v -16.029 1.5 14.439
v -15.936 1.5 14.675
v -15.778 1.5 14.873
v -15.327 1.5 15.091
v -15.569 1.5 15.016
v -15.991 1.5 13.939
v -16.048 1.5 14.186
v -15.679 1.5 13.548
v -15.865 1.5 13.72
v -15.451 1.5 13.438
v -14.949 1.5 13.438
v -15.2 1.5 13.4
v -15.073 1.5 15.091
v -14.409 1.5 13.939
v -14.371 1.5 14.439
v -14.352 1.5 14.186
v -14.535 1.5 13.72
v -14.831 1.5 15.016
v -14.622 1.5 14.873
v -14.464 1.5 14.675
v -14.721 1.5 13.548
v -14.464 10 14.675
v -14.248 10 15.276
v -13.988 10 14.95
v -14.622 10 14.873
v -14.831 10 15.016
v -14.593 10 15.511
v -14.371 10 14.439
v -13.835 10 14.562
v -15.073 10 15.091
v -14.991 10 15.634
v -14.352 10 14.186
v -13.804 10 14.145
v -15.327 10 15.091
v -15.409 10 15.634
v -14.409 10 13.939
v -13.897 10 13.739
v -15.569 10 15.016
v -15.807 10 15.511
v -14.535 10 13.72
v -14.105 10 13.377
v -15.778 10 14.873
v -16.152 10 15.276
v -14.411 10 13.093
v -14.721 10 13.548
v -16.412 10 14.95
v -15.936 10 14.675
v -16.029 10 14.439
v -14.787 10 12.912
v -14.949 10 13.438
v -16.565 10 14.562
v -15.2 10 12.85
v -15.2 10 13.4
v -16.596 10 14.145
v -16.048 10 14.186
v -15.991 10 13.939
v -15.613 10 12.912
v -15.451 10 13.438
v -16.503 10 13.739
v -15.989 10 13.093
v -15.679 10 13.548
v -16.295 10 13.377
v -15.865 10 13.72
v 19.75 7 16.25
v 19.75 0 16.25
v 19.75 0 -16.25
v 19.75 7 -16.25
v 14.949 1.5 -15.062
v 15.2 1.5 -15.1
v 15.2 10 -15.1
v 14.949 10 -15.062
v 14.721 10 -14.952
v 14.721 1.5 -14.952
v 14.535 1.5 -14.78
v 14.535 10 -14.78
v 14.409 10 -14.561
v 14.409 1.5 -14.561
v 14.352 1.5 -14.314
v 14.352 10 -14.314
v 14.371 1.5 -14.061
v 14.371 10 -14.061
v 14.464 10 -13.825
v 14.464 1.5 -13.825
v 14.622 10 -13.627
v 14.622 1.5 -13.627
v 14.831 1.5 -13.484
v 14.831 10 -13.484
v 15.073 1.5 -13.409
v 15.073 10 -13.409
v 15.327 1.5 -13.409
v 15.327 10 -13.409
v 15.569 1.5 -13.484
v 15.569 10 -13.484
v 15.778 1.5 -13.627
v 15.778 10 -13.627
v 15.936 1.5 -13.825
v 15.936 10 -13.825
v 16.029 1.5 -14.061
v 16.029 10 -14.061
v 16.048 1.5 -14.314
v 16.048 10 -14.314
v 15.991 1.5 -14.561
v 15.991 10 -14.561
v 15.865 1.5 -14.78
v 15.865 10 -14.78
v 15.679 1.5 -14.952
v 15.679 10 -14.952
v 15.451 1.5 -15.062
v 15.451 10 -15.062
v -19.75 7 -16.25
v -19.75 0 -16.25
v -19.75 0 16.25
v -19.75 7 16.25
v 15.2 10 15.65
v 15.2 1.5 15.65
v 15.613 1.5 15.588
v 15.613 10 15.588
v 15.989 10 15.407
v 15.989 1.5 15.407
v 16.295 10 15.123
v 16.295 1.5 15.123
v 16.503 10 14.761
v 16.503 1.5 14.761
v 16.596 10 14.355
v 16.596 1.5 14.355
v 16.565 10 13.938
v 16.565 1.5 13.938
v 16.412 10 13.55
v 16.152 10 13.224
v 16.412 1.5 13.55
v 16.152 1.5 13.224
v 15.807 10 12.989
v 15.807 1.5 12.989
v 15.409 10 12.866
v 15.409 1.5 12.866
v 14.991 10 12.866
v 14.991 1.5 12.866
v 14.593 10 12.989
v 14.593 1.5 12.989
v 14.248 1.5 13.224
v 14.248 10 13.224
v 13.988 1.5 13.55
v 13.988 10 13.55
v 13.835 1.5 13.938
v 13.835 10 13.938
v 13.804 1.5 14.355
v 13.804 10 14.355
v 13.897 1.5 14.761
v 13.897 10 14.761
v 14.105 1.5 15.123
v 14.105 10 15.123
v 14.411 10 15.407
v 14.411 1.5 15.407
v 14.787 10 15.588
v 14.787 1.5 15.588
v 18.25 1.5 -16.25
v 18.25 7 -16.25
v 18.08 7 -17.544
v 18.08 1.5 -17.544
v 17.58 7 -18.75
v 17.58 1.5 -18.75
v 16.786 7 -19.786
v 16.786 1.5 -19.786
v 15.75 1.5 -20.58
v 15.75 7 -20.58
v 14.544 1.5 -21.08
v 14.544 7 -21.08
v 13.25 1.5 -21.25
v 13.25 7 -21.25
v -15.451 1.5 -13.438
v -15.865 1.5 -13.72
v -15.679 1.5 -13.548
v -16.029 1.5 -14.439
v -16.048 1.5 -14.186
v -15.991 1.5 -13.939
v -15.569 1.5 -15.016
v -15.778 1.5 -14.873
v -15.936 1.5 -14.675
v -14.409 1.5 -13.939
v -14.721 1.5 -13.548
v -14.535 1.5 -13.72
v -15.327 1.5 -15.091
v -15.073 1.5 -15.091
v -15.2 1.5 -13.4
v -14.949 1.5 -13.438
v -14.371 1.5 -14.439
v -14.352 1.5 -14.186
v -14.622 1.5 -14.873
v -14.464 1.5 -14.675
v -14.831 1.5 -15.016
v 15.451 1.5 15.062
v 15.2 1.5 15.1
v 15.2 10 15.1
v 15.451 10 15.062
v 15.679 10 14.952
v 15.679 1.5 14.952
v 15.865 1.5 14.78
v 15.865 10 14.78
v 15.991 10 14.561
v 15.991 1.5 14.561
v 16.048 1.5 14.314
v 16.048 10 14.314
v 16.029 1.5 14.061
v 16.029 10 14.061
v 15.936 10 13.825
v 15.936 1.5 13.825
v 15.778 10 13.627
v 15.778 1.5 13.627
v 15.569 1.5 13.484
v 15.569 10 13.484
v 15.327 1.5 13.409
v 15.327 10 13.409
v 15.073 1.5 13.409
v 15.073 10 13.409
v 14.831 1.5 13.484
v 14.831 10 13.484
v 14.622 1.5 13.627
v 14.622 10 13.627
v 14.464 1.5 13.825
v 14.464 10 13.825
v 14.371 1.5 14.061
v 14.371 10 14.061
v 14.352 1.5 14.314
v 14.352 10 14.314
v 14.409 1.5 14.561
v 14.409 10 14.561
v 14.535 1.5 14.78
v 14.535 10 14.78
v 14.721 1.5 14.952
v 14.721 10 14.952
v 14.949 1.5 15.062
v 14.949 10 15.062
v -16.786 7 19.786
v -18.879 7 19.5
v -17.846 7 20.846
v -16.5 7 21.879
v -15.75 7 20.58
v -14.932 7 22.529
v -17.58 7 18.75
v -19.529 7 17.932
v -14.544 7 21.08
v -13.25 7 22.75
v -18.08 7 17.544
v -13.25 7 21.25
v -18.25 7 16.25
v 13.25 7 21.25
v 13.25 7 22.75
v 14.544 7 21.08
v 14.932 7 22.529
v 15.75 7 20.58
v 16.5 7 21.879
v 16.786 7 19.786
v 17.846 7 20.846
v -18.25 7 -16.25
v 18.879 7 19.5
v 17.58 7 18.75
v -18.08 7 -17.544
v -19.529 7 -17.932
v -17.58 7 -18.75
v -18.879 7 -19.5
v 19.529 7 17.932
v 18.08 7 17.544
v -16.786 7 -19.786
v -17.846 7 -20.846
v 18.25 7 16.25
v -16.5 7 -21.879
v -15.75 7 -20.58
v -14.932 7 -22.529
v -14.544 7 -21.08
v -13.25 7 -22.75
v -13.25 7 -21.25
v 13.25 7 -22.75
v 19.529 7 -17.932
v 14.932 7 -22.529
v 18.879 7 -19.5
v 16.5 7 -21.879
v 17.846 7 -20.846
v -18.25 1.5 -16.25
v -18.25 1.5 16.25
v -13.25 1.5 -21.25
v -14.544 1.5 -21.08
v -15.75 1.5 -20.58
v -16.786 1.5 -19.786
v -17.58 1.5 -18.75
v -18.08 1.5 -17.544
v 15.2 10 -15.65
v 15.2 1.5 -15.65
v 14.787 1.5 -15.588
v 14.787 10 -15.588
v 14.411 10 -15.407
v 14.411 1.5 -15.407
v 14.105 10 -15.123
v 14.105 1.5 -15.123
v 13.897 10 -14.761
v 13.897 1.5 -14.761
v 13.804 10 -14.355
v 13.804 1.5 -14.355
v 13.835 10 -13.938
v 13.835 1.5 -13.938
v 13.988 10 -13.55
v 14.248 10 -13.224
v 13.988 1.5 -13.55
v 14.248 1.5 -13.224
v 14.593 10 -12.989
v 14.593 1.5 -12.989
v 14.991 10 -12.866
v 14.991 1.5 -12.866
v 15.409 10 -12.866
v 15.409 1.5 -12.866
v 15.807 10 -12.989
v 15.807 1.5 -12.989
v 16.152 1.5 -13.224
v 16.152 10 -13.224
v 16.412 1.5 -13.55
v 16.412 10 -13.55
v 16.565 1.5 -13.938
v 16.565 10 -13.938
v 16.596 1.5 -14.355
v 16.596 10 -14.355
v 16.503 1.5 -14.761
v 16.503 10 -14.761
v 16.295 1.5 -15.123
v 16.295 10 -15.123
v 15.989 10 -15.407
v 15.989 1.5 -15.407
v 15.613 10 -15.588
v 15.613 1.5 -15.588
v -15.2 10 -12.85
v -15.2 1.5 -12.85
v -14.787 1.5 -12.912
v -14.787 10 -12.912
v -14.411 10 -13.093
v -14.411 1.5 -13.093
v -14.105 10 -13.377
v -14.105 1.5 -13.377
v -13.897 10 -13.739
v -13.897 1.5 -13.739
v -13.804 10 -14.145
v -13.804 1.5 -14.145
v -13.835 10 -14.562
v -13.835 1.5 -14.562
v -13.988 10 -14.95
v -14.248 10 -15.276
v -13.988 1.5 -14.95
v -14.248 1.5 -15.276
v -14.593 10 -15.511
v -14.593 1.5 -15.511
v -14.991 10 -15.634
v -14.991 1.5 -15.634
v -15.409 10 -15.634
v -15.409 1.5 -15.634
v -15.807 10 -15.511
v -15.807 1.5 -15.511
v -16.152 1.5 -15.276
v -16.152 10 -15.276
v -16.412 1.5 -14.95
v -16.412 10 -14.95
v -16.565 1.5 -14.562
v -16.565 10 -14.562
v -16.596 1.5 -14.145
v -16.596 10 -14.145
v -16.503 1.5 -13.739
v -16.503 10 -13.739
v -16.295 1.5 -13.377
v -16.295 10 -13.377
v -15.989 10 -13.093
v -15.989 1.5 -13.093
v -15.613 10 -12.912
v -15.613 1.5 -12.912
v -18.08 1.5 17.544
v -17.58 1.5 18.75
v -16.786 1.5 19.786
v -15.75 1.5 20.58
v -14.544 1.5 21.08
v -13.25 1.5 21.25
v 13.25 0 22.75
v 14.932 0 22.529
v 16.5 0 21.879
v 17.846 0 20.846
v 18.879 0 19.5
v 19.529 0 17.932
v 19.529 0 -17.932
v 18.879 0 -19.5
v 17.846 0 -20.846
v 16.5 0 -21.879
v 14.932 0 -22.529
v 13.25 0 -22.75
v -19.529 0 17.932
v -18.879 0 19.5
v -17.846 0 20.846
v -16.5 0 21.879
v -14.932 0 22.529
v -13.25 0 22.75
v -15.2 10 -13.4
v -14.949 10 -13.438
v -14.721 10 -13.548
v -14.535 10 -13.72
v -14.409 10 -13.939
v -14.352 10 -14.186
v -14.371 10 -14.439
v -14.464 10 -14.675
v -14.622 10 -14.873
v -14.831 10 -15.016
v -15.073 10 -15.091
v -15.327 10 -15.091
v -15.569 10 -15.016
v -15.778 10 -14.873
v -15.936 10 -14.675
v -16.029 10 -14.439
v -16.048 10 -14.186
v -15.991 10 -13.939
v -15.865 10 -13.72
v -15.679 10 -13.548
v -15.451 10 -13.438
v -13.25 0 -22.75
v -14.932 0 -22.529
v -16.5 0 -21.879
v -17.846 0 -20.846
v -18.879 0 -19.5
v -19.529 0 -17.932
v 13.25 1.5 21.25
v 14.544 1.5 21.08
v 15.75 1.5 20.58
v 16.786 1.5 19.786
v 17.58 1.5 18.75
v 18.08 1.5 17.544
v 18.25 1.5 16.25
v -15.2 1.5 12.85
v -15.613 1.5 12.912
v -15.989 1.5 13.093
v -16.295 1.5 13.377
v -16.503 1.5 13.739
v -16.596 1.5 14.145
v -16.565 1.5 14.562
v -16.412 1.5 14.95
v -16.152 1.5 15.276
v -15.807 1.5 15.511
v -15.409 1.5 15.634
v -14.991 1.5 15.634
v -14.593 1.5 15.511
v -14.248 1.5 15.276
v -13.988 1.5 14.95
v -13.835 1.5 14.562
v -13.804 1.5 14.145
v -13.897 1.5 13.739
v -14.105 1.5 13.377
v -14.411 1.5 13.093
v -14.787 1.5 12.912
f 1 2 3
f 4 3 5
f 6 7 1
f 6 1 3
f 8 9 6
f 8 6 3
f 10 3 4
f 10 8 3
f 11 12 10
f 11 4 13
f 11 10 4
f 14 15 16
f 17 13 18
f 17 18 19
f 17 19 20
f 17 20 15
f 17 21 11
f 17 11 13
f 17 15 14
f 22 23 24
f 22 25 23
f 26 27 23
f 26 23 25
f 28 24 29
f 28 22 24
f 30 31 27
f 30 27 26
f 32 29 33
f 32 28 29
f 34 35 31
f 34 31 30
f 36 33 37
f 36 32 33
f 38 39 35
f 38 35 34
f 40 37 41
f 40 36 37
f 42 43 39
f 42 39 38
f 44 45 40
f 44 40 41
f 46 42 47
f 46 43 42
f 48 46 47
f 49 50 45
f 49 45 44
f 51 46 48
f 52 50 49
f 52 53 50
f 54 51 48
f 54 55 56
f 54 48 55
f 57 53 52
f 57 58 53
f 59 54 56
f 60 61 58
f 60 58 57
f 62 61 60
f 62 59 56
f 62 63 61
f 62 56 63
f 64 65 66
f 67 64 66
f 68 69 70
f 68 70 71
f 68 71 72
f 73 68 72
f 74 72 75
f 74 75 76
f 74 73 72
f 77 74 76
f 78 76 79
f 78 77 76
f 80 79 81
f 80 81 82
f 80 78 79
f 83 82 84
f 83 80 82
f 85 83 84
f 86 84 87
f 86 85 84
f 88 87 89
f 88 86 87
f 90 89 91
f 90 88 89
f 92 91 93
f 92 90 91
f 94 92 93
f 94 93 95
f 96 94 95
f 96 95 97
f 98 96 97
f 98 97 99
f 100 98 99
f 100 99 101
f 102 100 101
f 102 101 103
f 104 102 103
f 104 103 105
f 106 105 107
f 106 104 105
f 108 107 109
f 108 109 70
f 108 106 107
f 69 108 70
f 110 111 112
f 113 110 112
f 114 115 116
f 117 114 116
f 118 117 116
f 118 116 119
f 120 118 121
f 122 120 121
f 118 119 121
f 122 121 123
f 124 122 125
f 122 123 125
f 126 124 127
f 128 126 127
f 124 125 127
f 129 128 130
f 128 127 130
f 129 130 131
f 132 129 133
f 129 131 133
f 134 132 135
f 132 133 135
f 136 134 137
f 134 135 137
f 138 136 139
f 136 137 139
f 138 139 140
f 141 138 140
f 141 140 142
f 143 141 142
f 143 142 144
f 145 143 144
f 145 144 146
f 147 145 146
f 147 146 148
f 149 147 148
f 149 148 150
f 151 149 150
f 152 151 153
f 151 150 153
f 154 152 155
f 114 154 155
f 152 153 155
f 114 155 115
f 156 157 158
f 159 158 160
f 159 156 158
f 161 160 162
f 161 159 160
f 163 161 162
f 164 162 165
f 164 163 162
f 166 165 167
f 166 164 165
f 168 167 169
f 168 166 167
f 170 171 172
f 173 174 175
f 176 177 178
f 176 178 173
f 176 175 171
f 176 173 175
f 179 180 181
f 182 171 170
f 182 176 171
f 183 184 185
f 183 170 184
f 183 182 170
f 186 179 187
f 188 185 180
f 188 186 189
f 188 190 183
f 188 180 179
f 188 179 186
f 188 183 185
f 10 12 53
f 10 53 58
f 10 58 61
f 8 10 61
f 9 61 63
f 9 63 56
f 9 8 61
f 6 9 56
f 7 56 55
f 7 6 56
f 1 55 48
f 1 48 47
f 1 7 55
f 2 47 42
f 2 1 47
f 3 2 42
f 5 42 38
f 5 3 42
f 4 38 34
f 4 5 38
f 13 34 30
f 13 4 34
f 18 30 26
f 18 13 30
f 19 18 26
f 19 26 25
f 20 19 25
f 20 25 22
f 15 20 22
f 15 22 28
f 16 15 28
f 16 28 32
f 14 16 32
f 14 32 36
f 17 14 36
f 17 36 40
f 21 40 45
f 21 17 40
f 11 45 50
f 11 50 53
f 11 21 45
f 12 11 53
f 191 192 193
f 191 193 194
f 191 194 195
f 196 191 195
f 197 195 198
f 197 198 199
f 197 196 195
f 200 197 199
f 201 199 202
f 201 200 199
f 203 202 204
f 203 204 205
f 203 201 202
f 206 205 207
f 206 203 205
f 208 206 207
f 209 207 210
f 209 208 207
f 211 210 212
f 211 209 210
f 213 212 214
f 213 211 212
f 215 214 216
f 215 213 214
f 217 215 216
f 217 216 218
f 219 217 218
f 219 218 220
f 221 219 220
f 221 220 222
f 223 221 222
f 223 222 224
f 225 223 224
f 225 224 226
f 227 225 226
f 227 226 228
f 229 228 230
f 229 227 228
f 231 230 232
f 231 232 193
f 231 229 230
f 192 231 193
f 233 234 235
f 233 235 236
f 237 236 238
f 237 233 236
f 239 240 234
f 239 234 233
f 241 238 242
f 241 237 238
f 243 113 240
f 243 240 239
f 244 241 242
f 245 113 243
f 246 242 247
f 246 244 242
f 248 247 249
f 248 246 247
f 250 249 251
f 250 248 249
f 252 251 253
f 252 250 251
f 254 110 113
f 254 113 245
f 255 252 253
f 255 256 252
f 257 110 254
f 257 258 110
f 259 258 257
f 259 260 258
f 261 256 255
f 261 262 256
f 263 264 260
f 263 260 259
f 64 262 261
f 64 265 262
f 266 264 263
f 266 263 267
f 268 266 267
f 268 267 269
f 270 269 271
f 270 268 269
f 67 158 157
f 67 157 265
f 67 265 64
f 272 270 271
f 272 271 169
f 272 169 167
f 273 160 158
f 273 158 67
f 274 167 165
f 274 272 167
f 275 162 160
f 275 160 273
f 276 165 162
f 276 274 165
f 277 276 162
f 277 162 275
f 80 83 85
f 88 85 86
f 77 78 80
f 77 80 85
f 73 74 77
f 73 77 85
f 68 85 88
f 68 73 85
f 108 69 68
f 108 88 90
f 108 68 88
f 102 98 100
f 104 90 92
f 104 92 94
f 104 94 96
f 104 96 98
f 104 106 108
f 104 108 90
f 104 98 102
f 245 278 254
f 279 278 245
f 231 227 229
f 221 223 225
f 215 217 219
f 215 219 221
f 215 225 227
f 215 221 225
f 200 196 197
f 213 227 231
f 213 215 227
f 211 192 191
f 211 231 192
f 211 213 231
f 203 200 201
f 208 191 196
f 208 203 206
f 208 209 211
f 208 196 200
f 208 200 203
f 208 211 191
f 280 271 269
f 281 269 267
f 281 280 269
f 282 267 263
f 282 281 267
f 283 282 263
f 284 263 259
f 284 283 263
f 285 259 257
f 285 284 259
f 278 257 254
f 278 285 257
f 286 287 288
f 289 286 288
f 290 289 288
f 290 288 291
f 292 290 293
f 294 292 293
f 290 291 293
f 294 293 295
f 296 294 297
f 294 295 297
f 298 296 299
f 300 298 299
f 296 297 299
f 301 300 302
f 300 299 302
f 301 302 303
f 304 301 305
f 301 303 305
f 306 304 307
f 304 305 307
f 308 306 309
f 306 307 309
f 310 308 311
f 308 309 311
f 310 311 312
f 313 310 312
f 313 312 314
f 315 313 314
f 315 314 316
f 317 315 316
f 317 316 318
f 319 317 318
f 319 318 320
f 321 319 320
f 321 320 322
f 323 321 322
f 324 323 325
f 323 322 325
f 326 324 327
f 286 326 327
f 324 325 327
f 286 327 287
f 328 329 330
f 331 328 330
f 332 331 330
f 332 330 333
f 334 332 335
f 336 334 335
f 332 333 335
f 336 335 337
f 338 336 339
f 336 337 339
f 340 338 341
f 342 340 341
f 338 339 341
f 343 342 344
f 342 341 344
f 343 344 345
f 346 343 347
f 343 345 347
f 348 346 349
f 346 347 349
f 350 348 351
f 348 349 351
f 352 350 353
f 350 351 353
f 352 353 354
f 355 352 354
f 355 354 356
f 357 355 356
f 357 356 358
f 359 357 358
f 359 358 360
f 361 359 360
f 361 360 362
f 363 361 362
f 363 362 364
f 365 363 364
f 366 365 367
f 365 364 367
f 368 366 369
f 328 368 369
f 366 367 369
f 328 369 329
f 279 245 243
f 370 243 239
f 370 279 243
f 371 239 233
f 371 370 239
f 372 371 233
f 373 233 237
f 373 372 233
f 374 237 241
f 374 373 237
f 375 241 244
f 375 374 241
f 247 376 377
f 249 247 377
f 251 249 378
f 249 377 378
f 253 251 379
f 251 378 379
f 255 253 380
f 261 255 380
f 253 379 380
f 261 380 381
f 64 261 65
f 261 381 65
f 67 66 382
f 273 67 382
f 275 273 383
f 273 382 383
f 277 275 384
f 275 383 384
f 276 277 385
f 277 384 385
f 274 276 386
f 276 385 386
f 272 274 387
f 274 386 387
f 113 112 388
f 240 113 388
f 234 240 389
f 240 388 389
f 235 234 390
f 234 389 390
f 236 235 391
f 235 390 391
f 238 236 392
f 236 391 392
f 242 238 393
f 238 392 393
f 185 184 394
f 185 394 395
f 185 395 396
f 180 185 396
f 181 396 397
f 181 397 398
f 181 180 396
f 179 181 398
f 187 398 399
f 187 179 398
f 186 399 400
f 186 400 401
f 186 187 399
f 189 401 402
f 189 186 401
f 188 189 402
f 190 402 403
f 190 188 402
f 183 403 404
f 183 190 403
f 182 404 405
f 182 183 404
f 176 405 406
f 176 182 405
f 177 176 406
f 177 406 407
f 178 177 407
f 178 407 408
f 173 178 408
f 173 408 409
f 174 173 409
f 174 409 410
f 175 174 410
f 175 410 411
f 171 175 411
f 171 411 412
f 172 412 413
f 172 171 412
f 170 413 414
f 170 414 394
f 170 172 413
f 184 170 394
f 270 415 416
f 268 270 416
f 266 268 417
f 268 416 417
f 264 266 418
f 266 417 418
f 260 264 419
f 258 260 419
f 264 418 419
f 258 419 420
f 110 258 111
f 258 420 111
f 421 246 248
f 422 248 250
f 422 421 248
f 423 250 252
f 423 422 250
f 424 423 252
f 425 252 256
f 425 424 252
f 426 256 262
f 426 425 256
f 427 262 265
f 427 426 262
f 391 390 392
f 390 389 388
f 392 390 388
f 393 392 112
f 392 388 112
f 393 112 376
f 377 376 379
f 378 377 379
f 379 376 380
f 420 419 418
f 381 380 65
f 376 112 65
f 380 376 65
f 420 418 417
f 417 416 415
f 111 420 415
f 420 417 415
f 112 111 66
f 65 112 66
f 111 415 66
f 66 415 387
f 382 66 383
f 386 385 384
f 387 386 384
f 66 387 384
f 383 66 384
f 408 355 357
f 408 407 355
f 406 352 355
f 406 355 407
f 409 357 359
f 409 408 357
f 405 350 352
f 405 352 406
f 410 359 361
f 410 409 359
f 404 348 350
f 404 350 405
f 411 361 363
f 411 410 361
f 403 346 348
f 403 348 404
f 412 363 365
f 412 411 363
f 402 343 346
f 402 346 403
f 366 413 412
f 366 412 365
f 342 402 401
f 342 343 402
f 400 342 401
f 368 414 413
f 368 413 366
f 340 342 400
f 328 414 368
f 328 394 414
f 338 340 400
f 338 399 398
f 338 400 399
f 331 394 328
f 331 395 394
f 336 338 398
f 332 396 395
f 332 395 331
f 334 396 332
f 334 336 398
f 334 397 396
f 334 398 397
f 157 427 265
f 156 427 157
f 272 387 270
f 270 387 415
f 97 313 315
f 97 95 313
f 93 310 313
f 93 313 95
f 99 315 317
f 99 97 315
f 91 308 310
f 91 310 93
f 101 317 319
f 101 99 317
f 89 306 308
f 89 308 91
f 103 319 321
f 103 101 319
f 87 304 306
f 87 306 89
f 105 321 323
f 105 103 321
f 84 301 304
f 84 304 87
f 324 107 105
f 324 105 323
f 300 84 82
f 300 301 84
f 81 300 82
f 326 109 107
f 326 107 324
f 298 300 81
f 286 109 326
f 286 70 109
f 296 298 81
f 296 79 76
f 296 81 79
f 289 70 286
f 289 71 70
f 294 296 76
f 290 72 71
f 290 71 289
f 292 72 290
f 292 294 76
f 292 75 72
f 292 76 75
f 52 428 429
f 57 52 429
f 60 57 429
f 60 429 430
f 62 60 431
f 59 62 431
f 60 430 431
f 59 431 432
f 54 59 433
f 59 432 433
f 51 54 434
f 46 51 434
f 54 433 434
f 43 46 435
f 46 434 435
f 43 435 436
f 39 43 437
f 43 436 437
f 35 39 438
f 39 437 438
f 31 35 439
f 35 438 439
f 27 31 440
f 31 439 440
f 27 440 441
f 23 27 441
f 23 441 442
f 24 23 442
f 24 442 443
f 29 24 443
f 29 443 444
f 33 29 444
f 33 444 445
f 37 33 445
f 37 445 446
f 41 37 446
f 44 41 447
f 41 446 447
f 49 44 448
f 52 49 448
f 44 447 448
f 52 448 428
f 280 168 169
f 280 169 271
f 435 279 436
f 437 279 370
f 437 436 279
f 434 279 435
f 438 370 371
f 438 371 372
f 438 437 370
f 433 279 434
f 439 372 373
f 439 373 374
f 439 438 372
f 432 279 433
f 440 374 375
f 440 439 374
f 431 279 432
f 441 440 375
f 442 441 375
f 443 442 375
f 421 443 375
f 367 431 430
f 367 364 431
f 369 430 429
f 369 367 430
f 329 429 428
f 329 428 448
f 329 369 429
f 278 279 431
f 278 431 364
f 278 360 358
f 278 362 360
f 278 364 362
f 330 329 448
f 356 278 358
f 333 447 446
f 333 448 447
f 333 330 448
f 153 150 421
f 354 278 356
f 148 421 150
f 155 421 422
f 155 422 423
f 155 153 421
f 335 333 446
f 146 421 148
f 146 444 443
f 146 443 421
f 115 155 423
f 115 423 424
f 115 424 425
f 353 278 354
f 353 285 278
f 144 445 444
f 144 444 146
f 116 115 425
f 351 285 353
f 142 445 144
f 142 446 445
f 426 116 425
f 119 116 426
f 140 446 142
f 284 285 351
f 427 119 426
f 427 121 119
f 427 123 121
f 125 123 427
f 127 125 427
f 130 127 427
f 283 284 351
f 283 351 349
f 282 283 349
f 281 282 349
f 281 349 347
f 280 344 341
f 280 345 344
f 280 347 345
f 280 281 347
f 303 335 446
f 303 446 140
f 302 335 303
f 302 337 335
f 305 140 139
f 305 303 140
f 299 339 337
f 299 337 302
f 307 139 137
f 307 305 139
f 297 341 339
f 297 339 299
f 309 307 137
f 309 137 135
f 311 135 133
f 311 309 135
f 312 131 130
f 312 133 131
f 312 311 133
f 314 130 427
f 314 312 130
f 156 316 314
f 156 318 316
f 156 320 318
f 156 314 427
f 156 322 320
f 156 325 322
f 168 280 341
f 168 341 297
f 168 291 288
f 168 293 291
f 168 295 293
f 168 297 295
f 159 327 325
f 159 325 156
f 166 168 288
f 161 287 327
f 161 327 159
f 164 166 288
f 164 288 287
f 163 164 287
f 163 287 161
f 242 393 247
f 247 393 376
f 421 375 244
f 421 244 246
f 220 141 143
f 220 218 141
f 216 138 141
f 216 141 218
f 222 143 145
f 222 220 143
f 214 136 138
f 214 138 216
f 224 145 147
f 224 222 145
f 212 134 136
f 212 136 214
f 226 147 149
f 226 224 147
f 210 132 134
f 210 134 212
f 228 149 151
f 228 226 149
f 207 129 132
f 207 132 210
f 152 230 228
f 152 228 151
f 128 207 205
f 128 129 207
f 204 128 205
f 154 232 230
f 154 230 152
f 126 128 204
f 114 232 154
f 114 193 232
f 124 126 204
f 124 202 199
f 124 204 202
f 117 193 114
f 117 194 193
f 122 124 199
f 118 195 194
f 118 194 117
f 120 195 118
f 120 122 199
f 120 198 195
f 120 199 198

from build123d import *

# Parameters (mm, degrees)
SKETCH_1_W           = 36.5
SKETCH_1_H           = 42.5
EXTRUDE_1_DEPTH      = 1.5
FILLET_1_R           = 5
SKETCH_2_R           = 1.4
SKETCH_2_R_2         = 0.85
EXTRUDE_2_DEPTH      = 8.5
EXTRUDE_3_DEPTH      = 5.5
EXTRUDE_3_DEPTH_BACK = 1.5


with BuildPart() as part:
    # 草图1 → 凸台-拉伸1 (new body)
    with BuildSketch(Plane(origin=(0, 0, 0), x_dir=(1, 0, 0), z_dir=(0, 1, 0))):
        Rectangle(SKETCH_1_W, SKETCH_1_H)
    extrude(amount=EXTRUDE_1_DEPTH)

    # 圆角1
    fillet_1_edges = [part.edges().sort_by_distance(p)[0] for p in [
        (18.25, 0.75, 21.25),
        (-18.25, 0.75, 21.25),
        (-18.25, 0.75, -21.25),
        (18.25, 0.75, -21.25),
    ]]
    fillet(fillet_1_edges, radius=FILLET_1_R)

    # 草图2 → 凸台-拉伸2 (add)
    # profile 1 of 4: a face of its own
    with BuildSketch(Plane(origin=(0, 1.5, 0), x_dir=(1, 0, 0), z_dir=(0, 1, 0))):
        with Locations(Location((-15.2, 14.25, 0), (0, 0, 270))):
            Circle(SKETCH_2_R)
        with Locations(Location((-15.2, 14.25, 0), (0, 0, 270))):
            Circle(SKETCH_2_R_2, mode=Mode.SUBTRACT)
    # profile 2 of 4: a face of its own
    with BuildSketch(Plane(origin=(0, 1.5, 0), x_dir=(1, 0, 0), z_dir=(0, 1, 0))):
        with Locations(Location((-15.2, -14.25, 0), (0, 0, 90))):
            Circle(SKETCH_2_R)
        with Locations(Location((-15.2, -14.25, 0), (0, 0, 90))):
            Circle(SKETCH_2_R_2, mode=Mode.SUBTRACT)
    # profile 3 of 4: a face of its own
    with BuildSketch(Plane(origin=(0, 1.5, 0), x_dir=(1, 0, 0), z_dir=(0, 1, 0))):
        with Locations(Location((15.2, -14.25, 0), (0, 0, 270))):
            Circle(SKETCH_2_R)
        with Locations(Location((15.2, -14.25, 0), (0, 0, 270))):
            Circle(SKETCH_2_R_2, mode=Mode.SUBTRACT)
    # profile 4 of 4: a face of its own
    with BuildSketch(Plane(origin=(0, 1.5, 0), x_dir=(1, 0, 0), z_dir=(0, 1, 0))):
        with Locations(Location((15.2, 14.25, 0), (0, 0, 90))):
            Circle(SKETCH_2_R)
        with Locations(Location((15.2, 14.25, 0), (0, 0, 90))):
            Circle(SKETCH_2_R_2, mode=Mode.SUBTRACT)
    extrude(amount=EXTRUDE_2_DEPTH)

    # 草图3 → 凸台-拉伸3 (add, two sides: drawn at the far end of the back side and taken through both)
    with BuildSketch(Plane(origin=(0, 1.5, 0), x_dir=(1, 0, 0), z_dir=(0, 1, 0)).offset(-EXTRUDE_3_DEPTH_BACK)):
        with BuildLine():
            Line((-13.25, -22.75), (13.25, -22.75))
            ThreePointArc((13.25, -22.75), (17.846194078, -20.846194078), (19.75, -16.25))
            Line((19.75, -16.25), (19.75, 16.25))
            ThreePointArc((19.75, 16.25), (17.846194078, 20.846194078), (13.25, 22.75))
            Line((13.25, 22.75), (-13.25, 22.75))
            ThreePointArc((-13.25, 22.75), (-17.846194078, 20.846194078), (-19.75, 16.25))
            Line((-19.75, 16.25), (-19.75, -16.25))
            ThreePointArc((-19.75, -16.25), (-17.846194078, -20.846194078), (-13.25, -22.75))
        make_face()
        with BuildLine():
            Line((-13.25, -21.25), (13.25, -21.25))
            ThreePointArc((13.25, -21.25), (16.785533906, -19.785533906), (18.25, -16.25))
            Line((18.25, -16.25), (18.25, 16.25))
            ThreePointArc((18.25, 16.25), (16.785533906, 19.785533906), (13.25, 21.25))
            Line((13.25, 21.25), (-13.25, 21.25))
            ThreePointArc((-13.25, 21.25), (-16.785533906, 19.785533906), (-18.25, 16.25))
            Line((-18.25, 16.25), (-18.25, -16.25))
            ThreePointArc((-18.25, -16.25), (-16.785533906, -19.785533906), (-13.25, -21.25))
        make_face(mode=Mode.SUBTRACT)
    extrude(amount=EXTRUDE_3_DEPTH + EXTRUDE_3_DEPTH_BACK)


solid = part.part
